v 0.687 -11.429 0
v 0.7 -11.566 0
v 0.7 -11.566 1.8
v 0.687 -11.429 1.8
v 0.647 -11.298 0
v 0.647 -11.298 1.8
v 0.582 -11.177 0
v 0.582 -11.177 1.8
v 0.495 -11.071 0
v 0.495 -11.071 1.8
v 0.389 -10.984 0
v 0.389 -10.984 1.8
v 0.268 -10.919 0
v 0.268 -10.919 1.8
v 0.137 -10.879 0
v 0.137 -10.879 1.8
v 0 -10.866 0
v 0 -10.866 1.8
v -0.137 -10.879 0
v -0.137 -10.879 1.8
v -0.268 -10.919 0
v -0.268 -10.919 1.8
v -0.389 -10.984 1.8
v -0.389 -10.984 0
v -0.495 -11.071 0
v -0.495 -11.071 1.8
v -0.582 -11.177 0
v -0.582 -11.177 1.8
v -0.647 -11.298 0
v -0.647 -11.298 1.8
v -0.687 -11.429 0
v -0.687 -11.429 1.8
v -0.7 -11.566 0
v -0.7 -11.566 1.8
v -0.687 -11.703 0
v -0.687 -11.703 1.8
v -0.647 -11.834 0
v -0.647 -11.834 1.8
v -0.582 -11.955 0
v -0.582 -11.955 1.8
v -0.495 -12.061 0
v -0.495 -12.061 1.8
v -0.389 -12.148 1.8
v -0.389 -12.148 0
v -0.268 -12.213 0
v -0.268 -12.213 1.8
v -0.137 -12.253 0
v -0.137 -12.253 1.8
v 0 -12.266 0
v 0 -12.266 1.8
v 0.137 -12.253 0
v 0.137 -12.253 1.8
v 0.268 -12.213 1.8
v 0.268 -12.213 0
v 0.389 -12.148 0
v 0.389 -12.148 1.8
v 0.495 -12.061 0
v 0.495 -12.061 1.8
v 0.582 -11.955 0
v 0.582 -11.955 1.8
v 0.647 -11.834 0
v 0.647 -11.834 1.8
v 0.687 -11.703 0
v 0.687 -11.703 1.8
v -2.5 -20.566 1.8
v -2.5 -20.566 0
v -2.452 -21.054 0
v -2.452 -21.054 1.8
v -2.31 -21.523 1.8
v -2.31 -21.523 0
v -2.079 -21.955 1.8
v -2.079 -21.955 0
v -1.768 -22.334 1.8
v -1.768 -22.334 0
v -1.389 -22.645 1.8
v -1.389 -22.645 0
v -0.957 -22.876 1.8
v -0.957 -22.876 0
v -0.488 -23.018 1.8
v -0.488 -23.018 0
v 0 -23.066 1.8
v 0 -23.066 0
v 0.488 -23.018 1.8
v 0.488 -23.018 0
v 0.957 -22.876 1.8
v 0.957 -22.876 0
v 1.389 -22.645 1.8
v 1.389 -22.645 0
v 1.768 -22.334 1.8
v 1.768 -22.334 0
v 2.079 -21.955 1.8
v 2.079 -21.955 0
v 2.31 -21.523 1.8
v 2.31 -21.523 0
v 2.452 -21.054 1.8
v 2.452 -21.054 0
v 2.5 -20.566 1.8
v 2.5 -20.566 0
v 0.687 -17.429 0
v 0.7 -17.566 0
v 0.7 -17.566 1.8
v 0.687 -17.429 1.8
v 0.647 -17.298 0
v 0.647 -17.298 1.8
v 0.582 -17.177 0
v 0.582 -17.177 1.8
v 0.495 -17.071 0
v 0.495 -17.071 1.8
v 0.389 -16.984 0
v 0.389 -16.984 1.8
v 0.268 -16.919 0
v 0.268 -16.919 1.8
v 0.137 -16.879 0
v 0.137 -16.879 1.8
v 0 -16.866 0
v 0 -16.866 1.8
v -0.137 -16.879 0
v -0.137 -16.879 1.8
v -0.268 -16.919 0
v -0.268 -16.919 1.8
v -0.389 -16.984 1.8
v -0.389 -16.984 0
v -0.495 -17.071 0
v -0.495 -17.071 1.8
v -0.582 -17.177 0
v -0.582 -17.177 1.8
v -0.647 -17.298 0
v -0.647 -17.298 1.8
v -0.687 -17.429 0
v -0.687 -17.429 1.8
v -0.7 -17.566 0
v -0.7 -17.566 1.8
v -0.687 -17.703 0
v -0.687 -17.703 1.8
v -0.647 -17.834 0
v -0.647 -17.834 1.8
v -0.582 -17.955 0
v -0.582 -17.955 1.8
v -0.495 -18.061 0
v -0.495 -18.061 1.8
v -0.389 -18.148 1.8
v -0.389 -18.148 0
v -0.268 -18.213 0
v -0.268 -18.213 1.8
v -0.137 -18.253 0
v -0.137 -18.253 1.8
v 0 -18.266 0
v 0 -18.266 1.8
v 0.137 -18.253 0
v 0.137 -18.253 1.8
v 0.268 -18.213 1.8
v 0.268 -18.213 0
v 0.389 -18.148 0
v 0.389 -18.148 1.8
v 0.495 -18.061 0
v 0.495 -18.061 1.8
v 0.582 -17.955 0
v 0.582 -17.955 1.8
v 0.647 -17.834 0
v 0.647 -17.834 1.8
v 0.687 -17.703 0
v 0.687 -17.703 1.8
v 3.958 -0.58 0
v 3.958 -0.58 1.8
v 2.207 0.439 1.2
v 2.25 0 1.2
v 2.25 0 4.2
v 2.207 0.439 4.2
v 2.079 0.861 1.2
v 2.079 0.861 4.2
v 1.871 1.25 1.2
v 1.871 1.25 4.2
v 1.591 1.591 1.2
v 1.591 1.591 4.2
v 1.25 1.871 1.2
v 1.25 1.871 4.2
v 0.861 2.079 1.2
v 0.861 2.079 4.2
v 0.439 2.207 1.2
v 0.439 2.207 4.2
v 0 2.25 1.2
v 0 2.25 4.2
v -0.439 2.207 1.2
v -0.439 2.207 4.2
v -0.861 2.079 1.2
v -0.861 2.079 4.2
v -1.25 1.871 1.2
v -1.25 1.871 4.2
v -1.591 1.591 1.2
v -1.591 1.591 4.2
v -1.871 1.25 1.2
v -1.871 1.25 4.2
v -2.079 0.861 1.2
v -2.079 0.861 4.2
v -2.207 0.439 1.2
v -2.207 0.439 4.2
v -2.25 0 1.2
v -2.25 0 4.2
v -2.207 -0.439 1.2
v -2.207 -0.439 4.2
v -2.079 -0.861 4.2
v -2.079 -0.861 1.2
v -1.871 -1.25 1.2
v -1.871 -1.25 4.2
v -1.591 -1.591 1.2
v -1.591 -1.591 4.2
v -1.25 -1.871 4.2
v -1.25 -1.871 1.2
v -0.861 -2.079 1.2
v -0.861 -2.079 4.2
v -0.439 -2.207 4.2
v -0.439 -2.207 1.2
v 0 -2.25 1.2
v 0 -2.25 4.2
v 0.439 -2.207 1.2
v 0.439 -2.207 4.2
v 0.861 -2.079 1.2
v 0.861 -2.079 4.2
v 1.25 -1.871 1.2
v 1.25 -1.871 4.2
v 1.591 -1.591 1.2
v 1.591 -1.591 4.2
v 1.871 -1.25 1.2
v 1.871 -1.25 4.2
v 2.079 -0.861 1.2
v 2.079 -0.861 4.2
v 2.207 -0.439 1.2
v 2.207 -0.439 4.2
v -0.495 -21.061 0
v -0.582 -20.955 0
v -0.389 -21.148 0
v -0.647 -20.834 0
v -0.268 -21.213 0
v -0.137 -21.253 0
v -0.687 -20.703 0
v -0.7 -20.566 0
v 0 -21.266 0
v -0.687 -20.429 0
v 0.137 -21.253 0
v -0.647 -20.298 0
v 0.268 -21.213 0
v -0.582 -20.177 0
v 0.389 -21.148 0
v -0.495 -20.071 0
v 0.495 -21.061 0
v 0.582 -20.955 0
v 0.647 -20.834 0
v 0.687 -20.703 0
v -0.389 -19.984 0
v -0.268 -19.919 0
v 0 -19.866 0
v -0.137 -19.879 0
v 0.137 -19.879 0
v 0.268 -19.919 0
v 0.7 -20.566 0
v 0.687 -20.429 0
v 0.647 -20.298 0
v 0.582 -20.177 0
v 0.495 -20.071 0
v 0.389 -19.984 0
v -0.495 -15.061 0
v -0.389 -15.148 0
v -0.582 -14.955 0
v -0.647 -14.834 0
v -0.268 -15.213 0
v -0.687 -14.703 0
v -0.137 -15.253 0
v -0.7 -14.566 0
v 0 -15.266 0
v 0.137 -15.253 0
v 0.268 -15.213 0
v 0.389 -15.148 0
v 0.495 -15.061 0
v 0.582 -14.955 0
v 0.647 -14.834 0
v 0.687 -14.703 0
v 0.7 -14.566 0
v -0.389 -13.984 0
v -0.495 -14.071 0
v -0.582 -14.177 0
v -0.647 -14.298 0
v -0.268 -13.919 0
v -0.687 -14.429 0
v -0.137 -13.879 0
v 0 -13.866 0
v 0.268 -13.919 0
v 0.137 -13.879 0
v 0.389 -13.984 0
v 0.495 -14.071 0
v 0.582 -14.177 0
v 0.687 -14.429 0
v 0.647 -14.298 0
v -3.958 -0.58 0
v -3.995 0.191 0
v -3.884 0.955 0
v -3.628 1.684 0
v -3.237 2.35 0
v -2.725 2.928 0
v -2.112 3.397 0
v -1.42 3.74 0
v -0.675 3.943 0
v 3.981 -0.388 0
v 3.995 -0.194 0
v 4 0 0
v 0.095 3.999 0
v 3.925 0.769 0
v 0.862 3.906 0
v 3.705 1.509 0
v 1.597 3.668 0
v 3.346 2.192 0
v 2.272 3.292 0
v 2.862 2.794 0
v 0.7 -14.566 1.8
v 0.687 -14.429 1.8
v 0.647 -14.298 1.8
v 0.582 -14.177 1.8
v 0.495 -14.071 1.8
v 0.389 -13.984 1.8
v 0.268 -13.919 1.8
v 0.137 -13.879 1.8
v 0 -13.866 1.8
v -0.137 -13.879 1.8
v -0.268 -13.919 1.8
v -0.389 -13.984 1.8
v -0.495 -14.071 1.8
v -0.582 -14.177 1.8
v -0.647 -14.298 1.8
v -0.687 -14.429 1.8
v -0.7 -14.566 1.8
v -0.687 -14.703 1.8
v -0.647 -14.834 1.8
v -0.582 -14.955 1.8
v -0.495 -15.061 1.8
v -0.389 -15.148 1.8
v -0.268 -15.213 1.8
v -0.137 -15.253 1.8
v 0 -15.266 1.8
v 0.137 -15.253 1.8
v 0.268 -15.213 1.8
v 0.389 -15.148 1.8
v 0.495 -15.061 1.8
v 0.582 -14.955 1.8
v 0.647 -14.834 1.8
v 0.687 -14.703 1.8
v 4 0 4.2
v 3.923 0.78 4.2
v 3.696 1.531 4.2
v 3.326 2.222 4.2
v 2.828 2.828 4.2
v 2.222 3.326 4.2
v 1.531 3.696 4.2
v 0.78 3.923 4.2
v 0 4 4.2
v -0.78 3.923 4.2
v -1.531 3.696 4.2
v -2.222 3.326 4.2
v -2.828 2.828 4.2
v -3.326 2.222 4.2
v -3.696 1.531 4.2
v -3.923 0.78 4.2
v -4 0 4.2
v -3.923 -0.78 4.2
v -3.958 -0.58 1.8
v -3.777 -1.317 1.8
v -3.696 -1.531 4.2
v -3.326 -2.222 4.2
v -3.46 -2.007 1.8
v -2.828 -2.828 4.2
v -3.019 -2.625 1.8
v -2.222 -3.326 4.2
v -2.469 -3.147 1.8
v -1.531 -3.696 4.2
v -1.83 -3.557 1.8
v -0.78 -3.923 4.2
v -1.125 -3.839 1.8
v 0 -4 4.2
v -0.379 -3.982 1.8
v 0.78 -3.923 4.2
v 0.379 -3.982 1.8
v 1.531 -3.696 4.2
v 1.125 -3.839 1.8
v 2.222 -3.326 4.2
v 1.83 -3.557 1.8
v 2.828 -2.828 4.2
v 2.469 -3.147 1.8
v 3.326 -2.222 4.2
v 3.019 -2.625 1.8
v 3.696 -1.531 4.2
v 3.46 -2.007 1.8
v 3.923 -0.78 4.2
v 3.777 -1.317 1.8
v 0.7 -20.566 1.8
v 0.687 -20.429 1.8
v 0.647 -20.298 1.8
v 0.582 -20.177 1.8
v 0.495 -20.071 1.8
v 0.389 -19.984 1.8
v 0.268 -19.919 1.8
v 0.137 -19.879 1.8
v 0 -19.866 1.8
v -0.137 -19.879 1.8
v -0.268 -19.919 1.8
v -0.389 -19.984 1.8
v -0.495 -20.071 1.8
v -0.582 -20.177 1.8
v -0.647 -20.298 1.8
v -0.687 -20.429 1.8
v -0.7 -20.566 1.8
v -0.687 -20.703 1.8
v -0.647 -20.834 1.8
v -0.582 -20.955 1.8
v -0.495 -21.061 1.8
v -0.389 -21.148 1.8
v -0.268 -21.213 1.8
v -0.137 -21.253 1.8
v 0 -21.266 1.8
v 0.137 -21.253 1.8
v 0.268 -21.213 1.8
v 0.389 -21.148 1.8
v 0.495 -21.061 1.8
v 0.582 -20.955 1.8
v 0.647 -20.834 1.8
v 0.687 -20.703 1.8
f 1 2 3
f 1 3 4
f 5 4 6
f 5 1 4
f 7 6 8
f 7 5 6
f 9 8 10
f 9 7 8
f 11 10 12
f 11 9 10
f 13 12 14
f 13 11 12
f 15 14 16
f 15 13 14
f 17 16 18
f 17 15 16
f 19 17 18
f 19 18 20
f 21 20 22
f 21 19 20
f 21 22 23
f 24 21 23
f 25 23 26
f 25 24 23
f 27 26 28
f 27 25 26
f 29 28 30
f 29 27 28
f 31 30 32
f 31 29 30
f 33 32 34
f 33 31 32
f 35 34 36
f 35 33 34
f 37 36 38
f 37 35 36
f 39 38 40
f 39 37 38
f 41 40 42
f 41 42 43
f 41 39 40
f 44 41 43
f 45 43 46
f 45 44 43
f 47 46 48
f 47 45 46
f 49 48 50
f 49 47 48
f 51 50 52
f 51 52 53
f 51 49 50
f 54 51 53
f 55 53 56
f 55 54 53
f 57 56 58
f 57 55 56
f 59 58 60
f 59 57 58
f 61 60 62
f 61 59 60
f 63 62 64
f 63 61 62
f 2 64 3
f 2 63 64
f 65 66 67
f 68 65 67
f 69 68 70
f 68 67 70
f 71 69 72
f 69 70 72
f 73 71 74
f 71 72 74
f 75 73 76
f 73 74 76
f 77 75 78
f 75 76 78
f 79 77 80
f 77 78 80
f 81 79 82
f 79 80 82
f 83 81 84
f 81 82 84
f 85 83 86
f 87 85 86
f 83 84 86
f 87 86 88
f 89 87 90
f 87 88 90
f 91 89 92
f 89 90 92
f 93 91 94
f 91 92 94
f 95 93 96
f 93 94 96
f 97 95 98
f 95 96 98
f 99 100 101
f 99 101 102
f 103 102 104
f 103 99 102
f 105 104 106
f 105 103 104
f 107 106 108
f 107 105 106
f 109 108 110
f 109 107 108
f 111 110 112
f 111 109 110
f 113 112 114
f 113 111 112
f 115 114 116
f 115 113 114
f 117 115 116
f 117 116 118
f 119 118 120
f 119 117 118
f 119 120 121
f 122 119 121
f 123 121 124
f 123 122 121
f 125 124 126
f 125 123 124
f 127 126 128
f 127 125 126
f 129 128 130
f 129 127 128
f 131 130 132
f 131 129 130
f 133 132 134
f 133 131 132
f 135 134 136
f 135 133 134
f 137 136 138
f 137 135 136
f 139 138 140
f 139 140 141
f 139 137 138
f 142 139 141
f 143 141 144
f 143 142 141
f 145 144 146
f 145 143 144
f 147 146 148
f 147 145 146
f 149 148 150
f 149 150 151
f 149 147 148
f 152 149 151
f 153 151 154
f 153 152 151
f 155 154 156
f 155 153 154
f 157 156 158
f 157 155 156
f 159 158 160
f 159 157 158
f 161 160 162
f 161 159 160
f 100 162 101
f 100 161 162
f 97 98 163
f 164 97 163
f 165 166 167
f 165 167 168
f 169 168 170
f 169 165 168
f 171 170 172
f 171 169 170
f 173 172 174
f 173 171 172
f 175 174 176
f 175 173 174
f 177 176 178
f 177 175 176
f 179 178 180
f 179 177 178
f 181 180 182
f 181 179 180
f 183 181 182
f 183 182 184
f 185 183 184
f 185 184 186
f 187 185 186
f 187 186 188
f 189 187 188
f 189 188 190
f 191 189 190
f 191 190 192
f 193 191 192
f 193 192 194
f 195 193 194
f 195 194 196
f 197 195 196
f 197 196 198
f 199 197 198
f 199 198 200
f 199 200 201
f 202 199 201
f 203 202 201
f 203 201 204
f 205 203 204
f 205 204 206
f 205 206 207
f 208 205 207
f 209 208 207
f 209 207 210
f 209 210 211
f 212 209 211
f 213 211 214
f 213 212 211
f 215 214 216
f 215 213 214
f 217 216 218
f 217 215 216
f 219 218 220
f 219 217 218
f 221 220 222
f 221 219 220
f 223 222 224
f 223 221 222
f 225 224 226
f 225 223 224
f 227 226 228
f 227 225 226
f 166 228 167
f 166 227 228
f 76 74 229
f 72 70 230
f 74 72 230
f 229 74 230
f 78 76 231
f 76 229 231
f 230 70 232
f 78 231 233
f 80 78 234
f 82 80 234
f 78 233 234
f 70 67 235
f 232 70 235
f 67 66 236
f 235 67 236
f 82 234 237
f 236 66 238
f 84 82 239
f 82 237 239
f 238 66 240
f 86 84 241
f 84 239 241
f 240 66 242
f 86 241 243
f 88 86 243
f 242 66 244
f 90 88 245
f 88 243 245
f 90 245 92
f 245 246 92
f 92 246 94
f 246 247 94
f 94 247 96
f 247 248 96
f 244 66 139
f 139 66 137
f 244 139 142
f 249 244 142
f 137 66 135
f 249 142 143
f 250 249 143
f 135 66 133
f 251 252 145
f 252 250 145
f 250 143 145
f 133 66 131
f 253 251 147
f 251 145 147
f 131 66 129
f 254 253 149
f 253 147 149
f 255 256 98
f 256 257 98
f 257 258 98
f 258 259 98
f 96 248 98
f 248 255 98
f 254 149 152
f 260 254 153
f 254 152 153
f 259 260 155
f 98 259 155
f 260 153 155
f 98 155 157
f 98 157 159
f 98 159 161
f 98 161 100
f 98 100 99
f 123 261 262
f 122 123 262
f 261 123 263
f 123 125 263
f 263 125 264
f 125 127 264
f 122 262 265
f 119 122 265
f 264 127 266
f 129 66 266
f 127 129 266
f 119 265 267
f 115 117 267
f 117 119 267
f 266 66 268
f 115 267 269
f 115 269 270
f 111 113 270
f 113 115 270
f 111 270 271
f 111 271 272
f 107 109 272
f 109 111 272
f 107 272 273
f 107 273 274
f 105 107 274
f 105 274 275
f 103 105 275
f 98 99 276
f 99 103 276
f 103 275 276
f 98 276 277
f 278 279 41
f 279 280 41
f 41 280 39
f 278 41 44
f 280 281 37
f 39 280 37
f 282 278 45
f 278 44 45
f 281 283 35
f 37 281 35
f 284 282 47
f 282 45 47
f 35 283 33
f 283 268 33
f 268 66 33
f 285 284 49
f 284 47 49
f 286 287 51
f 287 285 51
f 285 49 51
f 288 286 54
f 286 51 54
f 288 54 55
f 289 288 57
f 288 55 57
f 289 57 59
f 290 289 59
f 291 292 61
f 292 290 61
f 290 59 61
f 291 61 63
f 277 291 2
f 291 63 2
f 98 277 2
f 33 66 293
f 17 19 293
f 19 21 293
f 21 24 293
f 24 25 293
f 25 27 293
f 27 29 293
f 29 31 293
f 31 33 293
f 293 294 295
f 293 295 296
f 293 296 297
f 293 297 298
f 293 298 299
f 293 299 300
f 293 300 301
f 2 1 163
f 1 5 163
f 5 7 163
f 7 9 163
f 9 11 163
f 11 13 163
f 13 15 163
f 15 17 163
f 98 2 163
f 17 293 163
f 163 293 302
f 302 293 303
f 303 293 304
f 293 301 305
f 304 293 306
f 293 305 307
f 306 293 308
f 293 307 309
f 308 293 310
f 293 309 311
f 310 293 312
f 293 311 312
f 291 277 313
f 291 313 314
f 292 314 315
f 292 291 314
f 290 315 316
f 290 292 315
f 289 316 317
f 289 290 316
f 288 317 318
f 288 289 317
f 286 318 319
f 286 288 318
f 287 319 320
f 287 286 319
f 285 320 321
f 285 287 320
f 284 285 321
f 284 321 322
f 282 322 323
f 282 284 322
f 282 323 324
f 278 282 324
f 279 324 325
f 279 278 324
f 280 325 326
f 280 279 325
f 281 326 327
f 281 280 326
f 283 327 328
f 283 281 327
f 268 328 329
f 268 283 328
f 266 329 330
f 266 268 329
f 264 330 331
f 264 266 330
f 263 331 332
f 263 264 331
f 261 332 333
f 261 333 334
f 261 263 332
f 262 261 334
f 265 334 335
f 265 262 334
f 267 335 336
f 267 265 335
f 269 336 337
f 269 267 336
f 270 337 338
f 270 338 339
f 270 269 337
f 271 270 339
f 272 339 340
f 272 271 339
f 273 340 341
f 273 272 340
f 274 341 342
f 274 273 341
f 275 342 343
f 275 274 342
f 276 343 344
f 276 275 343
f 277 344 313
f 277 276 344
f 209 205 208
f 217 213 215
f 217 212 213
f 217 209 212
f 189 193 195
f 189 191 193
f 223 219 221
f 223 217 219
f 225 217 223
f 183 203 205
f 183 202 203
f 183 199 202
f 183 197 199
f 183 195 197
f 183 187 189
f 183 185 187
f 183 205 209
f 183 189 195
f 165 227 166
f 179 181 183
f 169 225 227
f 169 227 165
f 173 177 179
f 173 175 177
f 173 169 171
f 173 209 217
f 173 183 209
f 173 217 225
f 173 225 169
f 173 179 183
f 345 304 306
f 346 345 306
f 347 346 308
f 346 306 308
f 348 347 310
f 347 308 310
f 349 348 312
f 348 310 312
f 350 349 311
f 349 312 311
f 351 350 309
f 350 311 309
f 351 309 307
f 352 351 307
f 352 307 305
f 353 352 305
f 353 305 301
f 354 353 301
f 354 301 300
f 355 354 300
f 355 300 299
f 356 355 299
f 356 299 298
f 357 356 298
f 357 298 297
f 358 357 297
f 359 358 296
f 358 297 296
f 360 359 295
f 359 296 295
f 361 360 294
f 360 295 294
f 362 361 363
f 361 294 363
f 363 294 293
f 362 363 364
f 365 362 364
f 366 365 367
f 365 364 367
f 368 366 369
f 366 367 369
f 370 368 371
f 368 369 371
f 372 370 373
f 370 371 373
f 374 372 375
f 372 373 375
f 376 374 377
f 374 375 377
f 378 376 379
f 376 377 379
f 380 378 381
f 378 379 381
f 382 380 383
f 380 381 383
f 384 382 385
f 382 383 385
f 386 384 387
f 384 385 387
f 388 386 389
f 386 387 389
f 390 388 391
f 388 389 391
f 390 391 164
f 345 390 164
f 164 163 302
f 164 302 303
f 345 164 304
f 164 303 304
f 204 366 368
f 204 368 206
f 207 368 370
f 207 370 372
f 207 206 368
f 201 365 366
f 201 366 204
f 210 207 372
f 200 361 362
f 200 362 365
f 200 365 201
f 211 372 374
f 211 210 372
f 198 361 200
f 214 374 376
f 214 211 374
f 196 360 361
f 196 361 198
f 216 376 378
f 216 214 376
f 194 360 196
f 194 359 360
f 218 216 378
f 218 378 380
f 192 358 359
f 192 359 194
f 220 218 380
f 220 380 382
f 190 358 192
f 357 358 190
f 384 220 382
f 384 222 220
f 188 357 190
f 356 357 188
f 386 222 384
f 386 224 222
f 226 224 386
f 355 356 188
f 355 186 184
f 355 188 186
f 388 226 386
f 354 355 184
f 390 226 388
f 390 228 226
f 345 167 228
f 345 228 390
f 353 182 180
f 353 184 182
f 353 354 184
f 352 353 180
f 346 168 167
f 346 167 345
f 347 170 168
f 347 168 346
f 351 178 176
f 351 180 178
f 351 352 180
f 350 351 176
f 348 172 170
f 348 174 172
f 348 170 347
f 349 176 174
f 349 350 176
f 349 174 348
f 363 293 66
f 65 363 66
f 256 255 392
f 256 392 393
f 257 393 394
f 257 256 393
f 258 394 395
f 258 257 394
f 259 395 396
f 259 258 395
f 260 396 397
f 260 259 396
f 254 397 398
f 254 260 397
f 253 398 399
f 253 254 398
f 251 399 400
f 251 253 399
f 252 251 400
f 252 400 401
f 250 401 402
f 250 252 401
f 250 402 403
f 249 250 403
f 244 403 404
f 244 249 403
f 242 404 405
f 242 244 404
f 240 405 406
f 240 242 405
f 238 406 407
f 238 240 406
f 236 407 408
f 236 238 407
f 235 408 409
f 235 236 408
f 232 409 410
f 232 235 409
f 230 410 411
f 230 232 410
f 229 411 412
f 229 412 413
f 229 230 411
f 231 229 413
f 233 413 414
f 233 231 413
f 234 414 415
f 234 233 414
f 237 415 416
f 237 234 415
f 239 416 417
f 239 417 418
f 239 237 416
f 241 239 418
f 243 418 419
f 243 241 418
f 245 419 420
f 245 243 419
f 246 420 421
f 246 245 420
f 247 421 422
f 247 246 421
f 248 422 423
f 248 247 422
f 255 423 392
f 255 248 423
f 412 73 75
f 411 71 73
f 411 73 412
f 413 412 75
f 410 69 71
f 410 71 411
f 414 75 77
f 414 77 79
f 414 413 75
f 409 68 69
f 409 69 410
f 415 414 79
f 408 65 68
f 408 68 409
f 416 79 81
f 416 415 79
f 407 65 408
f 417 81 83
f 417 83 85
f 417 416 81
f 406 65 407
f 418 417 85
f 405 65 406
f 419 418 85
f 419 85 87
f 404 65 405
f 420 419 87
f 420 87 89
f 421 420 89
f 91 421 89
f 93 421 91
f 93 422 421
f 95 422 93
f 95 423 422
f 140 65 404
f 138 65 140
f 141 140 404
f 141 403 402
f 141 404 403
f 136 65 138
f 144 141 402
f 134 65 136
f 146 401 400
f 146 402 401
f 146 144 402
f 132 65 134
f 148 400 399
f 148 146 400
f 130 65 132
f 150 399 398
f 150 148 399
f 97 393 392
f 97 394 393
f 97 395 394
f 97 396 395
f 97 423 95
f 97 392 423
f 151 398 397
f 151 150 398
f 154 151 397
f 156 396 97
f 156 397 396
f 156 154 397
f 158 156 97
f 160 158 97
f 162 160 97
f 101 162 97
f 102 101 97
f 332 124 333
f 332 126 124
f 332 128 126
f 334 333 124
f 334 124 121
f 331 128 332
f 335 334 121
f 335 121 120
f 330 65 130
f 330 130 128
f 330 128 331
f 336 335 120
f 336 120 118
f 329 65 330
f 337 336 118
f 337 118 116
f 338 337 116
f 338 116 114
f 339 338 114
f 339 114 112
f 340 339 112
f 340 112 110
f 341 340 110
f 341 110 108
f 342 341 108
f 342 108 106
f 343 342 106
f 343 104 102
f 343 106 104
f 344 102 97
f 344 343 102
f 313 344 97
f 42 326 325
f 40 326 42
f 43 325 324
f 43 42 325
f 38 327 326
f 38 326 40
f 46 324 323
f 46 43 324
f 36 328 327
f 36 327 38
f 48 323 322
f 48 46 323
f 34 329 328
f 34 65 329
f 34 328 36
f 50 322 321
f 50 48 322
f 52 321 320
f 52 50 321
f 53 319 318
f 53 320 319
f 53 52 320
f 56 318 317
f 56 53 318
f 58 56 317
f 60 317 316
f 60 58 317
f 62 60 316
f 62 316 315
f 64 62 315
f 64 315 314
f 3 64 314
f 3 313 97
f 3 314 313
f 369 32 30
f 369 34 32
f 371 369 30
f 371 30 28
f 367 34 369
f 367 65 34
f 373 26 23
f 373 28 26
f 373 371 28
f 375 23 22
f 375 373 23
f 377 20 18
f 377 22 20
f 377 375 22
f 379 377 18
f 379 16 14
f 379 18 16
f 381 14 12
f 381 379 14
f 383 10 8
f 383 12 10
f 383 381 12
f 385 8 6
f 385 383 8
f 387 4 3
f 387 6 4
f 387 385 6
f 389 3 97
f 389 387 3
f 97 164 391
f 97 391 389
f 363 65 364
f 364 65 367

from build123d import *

# Parameters (mm, degrees)
ESBO_O1_R                = 4
ESBO_O1_R_2              = 2.25
RESSALTO_EXTRUS_O1_DEPTH = 4.2
ESBO_O3_R                = 0.7
RESSALTO_EXTRUS_O2_DEPTH = 1.8
ESBO_O4_R                = 2.5
RESSALTO_EXTRUS_O3_DEPTH = 1.2


with BuildPart() as part:
    # Esboço1 → Ressalto-extrusão1 (new body)
    with BuildSketch(Plane.XY):
        Circle(ESBO_O1_R)
        Circle(ESBO_O1_R_2, mode=Mode.SUBTRACT)
    extrude(amount=RESSALTO_EXTRUS_O1_DEPTH)

    # Esboço3 → Ressalto-extrusão2 (add)
    with BuildSketch(Plane.XY):
        with BuildLine():
            ThreePointArc((-2.5, -20.565998313), (0, -23.065998313), (2.5, -20.565998313))
            Line((2.5, -20.565998313), (3.957668004, -0.580399834))
            ThreePointArc((3.957668004, -0.580399834), (0, -4), (-3.957668004, -0.580399834))
            Line((-3.957668004, -0.580399834), (-2.5, -20.565998313))
        make_face()
        with Locations((0, -20.565998313)):
            Circle(ESBO_O3_R, mode=Mode.SUBTRACT)
        with Locations((0, -17.565998313)):
            Circle(ESBO_O3_R, mode=Mode.SUBTRACT)
        with Locations((0, -14.565998313)):
            Circle(ESBO_O3_R, mode=Mode.SUBTRACT)
        with Locations((0, -11.565998313)):
            Circle(ESBO_O3_R, mode=Mode.SUBTRACT)
    extrude(amount=RESSALTO_EXTRUS_O2_DEPTH)

    # Esboço4 → Ressalto-extrusão3 (add)
    with BuildSketch(Plane.XY):
        Circle(ESBO_O4_R)
    extrude(amount=RESSALTO_EXTRUS_O3_DEPTH)


solid = part.part
